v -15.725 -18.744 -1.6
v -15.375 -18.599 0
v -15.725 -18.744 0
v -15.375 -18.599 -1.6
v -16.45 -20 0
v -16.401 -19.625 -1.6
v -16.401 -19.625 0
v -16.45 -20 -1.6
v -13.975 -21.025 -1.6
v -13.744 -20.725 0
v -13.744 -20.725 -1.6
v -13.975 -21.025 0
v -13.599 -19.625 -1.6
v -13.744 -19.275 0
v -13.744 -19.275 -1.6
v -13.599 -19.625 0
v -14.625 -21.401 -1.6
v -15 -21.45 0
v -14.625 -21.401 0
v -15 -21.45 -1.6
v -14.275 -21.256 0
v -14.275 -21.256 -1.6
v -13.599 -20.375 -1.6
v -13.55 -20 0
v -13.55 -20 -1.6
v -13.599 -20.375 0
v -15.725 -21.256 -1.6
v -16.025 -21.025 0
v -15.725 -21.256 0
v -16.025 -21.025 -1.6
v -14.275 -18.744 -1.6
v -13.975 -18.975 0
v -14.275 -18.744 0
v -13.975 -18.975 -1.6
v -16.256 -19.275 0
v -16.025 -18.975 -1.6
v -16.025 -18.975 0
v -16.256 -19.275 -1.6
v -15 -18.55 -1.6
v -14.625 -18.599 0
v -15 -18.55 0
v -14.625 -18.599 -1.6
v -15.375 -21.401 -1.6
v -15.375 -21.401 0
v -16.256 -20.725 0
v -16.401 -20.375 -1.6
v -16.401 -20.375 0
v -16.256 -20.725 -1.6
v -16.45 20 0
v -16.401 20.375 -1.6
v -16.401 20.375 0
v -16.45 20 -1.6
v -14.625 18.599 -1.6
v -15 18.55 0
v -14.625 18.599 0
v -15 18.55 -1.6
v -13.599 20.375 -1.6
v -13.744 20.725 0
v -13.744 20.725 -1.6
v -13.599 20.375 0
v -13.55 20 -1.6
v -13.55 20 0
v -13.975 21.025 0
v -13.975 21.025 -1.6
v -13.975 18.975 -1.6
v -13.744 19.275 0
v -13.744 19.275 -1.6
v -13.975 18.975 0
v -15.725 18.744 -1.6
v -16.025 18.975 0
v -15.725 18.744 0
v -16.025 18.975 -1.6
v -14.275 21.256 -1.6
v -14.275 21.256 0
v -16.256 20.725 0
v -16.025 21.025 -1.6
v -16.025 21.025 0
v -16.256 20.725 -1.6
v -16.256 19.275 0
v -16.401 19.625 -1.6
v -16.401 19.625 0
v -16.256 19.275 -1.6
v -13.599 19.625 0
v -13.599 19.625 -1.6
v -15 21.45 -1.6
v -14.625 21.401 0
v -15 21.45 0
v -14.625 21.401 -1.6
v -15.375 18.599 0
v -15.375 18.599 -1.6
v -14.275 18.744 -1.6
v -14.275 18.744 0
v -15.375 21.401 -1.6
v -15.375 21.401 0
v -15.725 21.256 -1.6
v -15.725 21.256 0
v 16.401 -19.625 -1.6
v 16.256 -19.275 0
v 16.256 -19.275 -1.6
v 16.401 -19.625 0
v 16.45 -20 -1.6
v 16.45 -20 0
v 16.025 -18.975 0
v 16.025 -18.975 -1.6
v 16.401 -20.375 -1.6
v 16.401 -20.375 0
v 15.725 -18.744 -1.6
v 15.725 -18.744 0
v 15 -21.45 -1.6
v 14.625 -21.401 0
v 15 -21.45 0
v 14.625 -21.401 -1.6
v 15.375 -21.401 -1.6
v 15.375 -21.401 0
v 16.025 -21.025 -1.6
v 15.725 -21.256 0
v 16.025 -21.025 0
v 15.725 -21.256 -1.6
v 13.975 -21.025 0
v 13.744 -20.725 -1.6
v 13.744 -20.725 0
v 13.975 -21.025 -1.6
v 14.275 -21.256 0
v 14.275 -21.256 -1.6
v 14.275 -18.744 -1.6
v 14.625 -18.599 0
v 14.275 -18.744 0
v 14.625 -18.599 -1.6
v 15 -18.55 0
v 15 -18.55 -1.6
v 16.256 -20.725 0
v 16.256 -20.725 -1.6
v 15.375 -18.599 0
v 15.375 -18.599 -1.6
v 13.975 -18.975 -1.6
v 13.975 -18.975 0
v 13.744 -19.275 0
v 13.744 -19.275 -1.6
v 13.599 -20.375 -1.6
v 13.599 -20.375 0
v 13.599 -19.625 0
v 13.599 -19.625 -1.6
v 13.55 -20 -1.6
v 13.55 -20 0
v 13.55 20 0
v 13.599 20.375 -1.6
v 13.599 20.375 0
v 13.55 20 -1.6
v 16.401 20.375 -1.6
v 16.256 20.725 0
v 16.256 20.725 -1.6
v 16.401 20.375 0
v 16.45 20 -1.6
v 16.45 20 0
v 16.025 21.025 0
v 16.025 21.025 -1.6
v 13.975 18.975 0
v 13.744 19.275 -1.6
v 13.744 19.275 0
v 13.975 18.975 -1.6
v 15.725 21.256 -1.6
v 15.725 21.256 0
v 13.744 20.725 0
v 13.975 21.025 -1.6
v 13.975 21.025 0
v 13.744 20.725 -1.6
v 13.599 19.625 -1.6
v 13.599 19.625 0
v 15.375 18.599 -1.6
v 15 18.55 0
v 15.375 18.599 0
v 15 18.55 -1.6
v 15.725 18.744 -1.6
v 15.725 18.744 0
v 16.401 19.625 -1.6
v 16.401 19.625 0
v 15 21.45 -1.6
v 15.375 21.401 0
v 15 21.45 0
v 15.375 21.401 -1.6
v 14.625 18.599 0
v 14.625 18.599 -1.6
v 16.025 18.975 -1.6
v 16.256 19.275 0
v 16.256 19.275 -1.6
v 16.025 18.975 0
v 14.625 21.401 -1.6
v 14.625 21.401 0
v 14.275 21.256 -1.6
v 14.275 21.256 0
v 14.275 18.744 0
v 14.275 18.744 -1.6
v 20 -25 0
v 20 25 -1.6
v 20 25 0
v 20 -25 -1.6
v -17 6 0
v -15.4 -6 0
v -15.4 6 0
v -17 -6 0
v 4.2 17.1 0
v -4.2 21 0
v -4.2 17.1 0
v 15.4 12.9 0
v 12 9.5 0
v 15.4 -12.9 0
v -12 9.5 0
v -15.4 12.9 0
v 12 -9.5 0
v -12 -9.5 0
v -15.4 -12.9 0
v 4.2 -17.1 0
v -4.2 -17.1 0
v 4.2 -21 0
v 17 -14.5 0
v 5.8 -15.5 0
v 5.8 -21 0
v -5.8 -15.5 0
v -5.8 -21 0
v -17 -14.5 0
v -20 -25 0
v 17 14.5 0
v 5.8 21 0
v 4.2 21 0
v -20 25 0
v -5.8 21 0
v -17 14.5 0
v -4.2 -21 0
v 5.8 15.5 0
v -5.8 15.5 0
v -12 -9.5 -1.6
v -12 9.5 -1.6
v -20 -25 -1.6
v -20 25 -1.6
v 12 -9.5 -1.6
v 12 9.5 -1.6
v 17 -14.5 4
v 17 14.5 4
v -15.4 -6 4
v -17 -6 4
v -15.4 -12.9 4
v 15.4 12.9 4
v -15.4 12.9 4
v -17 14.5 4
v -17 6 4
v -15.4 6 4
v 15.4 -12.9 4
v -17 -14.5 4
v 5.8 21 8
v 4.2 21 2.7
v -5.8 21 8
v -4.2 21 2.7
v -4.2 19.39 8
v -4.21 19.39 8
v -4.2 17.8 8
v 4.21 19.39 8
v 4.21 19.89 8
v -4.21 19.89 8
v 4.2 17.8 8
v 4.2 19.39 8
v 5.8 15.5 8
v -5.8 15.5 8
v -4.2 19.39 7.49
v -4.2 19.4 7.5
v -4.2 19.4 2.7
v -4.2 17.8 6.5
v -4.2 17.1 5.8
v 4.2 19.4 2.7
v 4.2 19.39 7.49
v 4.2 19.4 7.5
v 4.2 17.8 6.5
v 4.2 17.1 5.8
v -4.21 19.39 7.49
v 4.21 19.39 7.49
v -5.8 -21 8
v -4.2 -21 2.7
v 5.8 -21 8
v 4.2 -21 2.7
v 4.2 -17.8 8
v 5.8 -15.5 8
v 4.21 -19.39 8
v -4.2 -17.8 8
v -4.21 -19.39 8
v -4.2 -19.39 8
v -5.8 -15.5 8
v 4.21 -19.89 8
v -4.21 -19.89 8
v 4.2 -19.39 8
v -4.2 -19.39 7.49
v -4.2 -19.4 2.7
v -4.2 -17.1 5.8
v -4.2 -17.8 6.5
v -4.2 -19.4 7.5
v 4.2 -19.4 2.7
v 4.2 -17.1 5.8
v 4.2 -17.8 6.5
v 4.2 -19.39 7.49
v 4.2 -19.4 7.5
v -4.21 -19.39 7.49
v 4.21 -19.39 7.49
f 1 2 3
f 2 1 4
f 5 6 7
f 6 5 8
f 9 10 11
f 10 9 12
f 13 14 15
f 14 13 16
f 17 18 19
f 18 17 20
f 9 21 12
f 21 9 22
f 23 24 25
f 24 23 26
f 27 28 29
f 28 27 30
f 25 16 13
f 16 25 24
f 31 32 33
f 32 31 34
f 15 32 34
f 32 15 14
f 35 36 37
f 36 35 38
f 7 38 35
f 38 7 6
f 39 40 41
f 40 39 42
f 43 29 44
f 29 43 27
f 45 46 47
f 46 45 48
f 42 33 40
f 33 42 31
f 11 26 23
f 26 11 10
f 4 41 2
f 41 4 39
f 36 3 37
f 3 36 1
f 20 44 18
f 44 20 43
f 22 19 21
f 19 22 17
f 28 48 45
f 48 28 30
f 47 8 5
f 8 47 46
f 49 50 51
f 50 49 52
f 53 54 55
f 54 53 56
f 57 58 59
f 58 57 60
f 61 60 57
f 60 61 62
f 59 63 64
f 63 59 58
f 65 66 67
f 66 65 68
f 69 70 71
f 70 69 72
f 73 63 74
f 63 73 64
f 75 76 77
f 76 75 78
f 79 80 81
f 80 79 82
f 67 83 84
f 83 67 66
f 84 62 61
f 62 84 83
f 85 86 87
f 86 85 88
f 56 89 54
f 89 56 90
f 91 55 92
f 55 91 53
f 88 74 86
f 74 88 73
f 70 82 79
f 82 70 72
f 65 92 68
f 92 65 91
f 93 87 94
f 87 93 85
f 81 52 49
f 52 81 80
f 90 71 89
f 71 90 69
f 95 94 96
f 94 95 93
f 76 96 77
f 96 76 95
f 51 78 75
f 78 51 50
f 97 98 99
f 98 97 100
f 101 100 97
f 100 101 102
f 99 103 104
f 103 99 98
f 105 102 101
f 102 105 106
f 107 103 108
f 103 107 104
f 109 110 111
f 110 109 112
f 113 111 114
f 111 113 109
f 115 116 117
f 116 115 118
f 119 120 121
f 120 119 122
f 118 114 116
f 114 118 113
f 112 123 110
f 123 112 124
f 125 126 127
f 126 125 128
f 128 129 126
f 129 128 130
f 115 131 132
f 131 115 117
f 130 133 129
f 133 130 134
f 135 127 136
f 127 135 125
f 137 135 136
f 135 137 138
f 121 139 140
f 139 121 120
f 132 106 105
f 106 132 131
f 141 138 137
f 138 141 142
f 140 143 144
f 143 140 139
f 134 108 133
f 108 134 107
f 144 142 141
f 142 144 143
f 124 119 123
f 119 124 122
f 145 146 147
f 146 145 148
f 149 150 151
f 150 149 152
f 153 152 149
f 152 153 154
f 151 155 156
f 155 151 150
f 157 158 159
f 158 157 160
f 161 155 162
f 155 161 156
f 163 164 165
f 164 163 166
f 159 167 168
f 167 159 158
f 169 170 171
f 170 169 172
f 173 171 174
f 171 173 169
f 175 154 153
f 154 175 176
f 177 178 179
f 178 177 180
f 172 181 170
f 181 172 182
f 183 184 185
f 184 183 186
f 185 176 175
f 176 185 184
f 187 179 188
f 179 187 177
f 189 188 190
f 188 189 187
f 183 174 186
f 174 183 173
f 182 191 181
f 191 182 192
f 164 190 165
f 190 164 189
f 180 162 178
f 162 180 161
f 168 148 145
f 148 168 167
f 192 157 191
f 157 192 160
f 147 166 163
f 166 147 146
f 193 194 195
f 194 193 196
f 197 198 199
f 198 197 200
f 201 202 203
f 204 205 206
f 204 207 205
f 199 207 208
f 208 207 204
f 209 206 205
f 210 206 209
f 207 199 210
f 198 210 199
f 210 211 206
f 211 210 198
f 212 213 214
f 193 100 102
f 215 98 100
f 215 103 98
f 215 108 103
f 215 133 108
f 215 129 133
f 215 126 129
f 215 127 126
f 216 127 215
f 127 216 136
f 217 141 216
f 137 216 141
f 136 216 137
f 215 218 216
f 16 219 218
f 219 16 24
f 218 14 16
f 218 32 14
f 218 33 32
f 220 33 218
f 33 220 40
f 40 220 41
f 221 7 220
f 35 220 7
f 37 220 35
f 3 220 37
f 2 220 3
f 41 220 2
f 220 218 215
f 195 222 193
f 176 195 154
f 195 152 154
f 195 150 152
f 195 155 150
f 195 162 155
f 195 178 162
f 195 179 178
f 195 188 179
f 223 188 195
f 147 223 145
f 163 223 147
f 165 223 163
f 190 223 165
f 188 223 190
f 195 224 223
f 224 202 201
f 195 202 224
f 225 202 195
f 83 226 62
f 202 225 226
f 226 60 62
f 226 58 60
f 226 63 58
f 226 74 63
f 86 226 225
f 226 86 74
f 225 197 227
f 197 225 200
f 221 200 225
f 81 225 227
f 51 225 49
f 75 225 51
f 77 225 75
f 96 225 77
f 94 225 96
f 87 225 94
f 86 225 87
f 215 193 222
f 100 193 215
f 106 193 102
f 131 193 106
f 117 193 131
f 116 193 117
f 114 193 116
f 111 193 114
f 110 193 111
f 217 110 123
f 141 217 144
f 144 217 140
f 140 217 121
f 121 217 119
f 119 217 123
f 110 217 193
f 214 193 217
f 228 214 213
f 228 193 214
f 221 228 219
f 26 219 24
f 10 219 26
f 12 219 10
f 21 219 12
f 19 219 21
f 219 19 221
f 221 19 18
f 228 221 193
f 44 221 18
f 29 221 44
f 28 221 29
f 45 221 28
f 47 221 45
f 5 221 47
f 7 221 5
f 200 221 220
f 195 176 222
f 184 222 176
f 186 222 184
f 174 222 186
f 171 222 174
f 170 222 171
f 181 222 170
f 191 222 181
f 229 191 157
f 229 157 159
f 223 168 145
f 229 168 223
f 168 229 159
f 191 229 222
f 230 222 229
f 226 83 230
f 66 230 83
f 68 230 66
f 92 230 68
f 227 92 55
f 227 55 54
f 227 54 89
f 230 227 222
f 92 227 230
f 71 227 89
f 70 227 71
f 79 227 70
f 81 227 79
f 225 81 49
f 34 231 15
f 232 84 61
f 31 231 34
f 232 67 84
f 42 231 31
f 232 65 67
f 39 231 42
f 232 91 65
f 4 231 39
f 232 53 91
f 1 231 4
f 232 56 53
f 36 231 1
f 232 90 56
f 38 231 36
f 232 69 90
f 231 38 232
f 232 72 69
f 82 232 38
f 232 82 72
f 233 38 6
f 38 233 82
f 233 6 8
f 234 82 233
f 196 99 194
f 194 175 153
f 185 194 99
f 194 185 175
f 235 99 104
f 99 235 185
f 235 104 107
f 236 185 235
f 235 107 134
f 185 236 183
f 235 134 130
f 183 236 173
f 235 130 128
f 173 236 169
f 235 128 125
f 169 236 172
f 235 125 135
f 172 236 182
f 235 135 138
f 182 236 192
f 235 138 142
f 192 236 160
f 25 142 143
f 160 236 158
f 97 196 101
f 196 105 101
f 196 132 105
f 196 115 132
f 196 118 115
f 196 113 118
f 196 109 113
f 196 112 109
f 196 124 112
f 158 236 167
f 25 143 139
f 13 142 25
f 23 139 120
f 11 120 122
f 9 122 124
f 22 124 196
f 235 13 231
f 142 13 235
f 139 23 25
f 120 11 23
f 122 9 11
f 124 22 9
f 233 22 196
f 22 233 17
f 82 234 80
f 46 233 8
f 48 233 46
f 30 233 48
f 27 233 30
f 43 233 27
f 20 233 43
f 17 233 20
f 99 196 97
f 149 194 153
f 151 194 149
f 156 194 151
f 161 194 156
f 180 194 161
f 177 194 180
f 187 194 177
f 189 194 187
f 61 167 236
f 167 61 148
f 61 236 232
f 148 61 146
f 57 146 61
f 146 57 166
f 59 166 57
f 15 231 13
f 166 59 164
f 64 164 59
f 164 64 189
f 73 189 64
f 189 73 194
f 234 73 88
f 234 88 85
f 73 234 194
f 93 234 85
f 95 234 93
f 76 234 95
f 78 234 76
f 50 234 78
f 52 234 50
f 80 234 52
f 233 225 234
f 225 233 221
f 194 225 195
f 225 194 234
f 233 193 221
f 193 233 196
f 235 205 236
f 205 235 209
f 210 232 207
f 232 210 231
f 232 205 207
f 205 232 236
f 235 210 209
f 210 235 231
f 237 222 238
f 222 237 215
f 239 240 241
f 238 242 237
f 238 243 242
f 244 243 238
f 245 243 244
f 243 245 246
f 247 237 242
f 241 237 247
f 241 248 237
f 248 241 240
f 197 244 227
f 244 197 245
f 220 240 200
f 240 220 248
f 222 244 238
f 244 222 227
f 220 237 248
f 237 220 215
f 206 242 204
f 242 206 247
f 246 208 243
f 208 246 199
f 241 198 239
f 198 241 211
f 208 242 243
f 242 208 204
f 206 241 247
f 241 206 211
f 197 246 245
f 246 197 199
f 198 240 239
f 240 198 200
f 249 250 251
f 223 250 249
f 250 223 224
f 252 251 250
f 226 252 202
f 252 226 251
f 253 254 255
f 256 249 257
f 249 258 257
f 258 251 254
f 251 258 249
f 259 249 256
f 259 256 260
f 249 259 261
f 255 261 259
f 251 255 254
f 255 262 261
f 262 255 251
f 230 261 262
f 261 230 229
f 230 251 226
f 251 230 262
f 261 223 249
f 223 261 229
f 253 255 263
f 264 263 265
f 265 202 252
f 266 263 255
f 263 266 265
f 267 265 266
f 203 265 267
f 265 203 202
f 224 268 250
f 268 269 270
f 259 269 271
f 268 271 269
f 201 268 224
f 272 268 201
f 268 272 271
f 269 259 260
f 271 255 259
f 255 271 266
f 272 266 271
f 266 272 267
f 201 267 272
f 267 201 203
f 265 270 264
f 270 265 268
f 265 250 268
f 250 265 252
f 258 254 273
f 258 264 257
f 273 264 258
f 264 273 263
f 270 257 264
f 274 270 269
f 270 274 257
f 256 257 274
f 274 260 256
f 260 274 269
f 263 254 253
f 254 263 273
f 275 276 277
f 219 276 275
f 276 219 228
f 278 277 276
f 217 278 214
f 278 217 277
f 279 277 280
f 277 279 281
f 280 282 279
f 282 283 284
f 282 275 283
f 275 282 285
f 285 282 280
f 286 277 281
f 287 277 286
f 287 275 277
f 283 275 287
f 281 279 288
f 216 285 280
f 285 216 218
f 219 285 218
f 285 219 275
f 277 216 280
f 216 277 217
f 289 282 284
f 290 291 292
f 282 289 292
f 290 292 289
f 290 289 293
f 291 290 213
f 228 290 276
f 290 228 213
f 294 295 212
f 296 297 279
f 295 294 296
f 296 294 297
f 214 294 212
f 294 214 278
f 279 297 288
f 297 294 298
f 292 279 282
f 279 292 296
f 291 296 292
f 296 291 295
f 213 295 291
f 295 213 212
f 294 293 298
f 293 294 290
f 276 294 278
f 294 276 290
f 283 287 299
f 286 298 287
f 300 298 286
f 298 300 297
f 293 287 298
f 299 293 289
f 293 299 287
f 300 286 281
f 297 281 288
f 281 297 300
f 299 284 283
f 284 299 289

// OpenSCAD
// file: ../../screw-post/screw-post.scad
//-----------------------------------------------------------------------
// Screw post: a round post off the floor that a board screws down onto
//
// Two ways to fix:
//   "nut"  clearance hole through the post and floor; the nut sits in a hex
//          trap in the floor's underside, so the screw goes in from the top
//   "tap"  a pilot hole the screw cuts its own thread in (one or two fittings
//          in PLA/PETG); blind, the floor stays whole underneath
// and "head" for a screw up from below (head in a counterbore, nut on top).
//
// Modules, all in the same frame:
//   screwPostGhost()     the screw (and nut), for previews
//   screwPost()          the post: add to the floor
//   screwPostFloorCut()  subtract from the floor: nut trap / counterbore and hole
//
// Frame: origin on the floor top, on the post's axis. Z up; the floor is
// Z = -floorThick .. 0. Units: mm.
//
// Sizes: "M2", "M2.5", "M3". screwPostScrew(size, ...) says which screw length
// reaches, so a project can assert it has that screw in the kit.
//-----------------------------------------------------------------------

//-- [name, screw Ø, nut across flats, nut thick, head Ø, head height, tap hole, post Ø]
//-- Nuts ISO 4032; heads ISO 7380 button. Tap holes: the usual ~0.8 x Ø for plastic
screwSizes = [
  ["M2",   2.0, 4.0, 1.6, 3.5, 1.1, 1.6, 5.0],
  ["M2.5", 2.5, 5.0, 2.0, 4.4, 1.4, 2.1, 6.0],    // head 4.4: measured on the kit's M2.5 (controller base)
  ["M3",   3.0, 5.5, 2.4, 5.7, 1.65, 2.5, 7.0],
];

screwHoleClear = 0.4;     // added to the screw Ø for a clearance hole
screwNutClear  = 0.3;     // CAL: across flats, nut trap over the nut. Set by the fit piece
screwTapClear  = 0.0;     // CAL: added to the tap hole. Set by the fit piece
screwHeadClear = 0.6;     // counterbore over the head Ø

function screwSize(size) = let (i = search([size], screwSizes)[0])
  assert(i != [] && i != undef, str("unknown screw size ", size)) screwSizes[i];
function screwDia(size)    = screwSize(size)[1];
function screwNutAF(size)  = screwSize(size)[2];
function screwNutH(size)   = screwSize(size)[3];
function screwHeadDia(size)= screwSize(size)[4];
function screwHeadH(size)  = screwSize(size)[5];
function screwPostDia(size)= screwSize(size)[7];

//-- Shortest screw that fills the nut, from the top of the clamped part (h + clamp
//-- above the floor) down to the nut trap's underside. Round up to a length you have.
function screwPostScrew(size, h, floorThick, clamp = 1.6) = h + clamp + floorThick;

module screwPostGhost(size, h, floorThick, clamp = 1.6, length, how = "nut")
{
  d = screwDia(size);
  L = is_undef(length) ? screwPostScrew(size, h, floorThick, clamp) : length;
  top = h + clamp;
  if (how == "head")
  {
    %color("Silver") translate([0, 0, -floorThick]) cylinder(d = screwHeadDia(size), h = screwHeadH(size), $fn = 24);
    %color("Silver") translate([0, 0, -floorThick + screwHeadH(size)]) cylinder(d = d, h = L, $fn = 16);
  }
  else
  {
    %color("Silver") translate([0, 0, top]) cylinder(d = screwHeadDia(size), h = screwHeadH(size), $fn = 24);
    %color("Silver") translate([0, 0, top - L]) cylinder(d = d, h = L, $fn = 16);
    if (how == "nut")
      %color("DimGray") translate([0, 0, -floorThick]) rotate([0, 0, 30]) cylinder(d = screwNutAF(size)/cos(30), h = screwNutH(size), $fn = 6);
  }
}

//-- how: "nut" | "head" (through hole) or "tap" (blind pilot hole). postDia defaults by size
module screwPost(size, h, how = "nut", postDia, tapClear = screwTapClear)
{
  pd = is_undef(postDia) ? screwPostDia(size) : postDia;
  hole = how == "tap" ? screwSize(size)[6] + tapClear : screwDia(size) + screwHoleClear;
  difference()
  {
    translate([0, 0, -0.01]) cylinder(d = pd, h = h + 0.01, $fn = 40);
    translate([0, 0, how == "tap" ? 0.6 : -1]) cylinder(d = hole, h = h + 2, $fn = 24);
    //-- lead-in so the screw starts square
    translate([0, 0, h - 0.4]) cylinder(d1 = hole, d2 = hole + 0.8, h = 0.41, $fn = 24);
  }
}

//-- "nut": hex trap from the underside, opening a little over the nut so it sits flush.
//-- "head": counterbore for the head. "tap": nothing.
module screwPostFloorCut(size, floorThick, how = "nut", nutClear = screwNutClear)
{
  d = screwDia(size) + screwHoleClear;
  if (how == "nut")
  {
    af = screwNutAF(size) + nutClear;
    translate([0, 0, -floorThick - 1]) rotate([0, 0, 30]) cylinder(d = af/cos(30), h = screwNutH(size) + 0.1 + 1, $fn = 6);
    translate([0, 0, -floorThick - 1]) cylinder(d = d + 0.4, h = floorThick + 2, $fn = 24);
  }
  if (how == "head")
  {
    translate([0, 0, -floorThick - 1]) cylinder(d = screwHeadDia(size) + screwHeadClear, h = screwHeadH(size) + 0.2 + 1, $fn = 32);
    translate([0, 0, -floorThick - 1]) cylinder(d = d + 0.4, h = floorThick + 2, $fn = 24);
  }
  assert(how == "tap" || floorThick >= (how == "nut" ? screwNutH(size) : screwHeadH(size)) + 0.1 + 0.3,
         str("floor too thin for the ", size, " ", how));
}
// main file
// The 602530's carrier for the catalogue: a 4 x 5 plate with the cradle on it and the
// bridge posts either side, as one piece of plastic. The bar is views/bar.scad; the pack
// is views/pack.scad (the cradle frame is the carrier frame).
use <../lipo-cradle.scad>

name = "602530";

lipoCarrier(name);
